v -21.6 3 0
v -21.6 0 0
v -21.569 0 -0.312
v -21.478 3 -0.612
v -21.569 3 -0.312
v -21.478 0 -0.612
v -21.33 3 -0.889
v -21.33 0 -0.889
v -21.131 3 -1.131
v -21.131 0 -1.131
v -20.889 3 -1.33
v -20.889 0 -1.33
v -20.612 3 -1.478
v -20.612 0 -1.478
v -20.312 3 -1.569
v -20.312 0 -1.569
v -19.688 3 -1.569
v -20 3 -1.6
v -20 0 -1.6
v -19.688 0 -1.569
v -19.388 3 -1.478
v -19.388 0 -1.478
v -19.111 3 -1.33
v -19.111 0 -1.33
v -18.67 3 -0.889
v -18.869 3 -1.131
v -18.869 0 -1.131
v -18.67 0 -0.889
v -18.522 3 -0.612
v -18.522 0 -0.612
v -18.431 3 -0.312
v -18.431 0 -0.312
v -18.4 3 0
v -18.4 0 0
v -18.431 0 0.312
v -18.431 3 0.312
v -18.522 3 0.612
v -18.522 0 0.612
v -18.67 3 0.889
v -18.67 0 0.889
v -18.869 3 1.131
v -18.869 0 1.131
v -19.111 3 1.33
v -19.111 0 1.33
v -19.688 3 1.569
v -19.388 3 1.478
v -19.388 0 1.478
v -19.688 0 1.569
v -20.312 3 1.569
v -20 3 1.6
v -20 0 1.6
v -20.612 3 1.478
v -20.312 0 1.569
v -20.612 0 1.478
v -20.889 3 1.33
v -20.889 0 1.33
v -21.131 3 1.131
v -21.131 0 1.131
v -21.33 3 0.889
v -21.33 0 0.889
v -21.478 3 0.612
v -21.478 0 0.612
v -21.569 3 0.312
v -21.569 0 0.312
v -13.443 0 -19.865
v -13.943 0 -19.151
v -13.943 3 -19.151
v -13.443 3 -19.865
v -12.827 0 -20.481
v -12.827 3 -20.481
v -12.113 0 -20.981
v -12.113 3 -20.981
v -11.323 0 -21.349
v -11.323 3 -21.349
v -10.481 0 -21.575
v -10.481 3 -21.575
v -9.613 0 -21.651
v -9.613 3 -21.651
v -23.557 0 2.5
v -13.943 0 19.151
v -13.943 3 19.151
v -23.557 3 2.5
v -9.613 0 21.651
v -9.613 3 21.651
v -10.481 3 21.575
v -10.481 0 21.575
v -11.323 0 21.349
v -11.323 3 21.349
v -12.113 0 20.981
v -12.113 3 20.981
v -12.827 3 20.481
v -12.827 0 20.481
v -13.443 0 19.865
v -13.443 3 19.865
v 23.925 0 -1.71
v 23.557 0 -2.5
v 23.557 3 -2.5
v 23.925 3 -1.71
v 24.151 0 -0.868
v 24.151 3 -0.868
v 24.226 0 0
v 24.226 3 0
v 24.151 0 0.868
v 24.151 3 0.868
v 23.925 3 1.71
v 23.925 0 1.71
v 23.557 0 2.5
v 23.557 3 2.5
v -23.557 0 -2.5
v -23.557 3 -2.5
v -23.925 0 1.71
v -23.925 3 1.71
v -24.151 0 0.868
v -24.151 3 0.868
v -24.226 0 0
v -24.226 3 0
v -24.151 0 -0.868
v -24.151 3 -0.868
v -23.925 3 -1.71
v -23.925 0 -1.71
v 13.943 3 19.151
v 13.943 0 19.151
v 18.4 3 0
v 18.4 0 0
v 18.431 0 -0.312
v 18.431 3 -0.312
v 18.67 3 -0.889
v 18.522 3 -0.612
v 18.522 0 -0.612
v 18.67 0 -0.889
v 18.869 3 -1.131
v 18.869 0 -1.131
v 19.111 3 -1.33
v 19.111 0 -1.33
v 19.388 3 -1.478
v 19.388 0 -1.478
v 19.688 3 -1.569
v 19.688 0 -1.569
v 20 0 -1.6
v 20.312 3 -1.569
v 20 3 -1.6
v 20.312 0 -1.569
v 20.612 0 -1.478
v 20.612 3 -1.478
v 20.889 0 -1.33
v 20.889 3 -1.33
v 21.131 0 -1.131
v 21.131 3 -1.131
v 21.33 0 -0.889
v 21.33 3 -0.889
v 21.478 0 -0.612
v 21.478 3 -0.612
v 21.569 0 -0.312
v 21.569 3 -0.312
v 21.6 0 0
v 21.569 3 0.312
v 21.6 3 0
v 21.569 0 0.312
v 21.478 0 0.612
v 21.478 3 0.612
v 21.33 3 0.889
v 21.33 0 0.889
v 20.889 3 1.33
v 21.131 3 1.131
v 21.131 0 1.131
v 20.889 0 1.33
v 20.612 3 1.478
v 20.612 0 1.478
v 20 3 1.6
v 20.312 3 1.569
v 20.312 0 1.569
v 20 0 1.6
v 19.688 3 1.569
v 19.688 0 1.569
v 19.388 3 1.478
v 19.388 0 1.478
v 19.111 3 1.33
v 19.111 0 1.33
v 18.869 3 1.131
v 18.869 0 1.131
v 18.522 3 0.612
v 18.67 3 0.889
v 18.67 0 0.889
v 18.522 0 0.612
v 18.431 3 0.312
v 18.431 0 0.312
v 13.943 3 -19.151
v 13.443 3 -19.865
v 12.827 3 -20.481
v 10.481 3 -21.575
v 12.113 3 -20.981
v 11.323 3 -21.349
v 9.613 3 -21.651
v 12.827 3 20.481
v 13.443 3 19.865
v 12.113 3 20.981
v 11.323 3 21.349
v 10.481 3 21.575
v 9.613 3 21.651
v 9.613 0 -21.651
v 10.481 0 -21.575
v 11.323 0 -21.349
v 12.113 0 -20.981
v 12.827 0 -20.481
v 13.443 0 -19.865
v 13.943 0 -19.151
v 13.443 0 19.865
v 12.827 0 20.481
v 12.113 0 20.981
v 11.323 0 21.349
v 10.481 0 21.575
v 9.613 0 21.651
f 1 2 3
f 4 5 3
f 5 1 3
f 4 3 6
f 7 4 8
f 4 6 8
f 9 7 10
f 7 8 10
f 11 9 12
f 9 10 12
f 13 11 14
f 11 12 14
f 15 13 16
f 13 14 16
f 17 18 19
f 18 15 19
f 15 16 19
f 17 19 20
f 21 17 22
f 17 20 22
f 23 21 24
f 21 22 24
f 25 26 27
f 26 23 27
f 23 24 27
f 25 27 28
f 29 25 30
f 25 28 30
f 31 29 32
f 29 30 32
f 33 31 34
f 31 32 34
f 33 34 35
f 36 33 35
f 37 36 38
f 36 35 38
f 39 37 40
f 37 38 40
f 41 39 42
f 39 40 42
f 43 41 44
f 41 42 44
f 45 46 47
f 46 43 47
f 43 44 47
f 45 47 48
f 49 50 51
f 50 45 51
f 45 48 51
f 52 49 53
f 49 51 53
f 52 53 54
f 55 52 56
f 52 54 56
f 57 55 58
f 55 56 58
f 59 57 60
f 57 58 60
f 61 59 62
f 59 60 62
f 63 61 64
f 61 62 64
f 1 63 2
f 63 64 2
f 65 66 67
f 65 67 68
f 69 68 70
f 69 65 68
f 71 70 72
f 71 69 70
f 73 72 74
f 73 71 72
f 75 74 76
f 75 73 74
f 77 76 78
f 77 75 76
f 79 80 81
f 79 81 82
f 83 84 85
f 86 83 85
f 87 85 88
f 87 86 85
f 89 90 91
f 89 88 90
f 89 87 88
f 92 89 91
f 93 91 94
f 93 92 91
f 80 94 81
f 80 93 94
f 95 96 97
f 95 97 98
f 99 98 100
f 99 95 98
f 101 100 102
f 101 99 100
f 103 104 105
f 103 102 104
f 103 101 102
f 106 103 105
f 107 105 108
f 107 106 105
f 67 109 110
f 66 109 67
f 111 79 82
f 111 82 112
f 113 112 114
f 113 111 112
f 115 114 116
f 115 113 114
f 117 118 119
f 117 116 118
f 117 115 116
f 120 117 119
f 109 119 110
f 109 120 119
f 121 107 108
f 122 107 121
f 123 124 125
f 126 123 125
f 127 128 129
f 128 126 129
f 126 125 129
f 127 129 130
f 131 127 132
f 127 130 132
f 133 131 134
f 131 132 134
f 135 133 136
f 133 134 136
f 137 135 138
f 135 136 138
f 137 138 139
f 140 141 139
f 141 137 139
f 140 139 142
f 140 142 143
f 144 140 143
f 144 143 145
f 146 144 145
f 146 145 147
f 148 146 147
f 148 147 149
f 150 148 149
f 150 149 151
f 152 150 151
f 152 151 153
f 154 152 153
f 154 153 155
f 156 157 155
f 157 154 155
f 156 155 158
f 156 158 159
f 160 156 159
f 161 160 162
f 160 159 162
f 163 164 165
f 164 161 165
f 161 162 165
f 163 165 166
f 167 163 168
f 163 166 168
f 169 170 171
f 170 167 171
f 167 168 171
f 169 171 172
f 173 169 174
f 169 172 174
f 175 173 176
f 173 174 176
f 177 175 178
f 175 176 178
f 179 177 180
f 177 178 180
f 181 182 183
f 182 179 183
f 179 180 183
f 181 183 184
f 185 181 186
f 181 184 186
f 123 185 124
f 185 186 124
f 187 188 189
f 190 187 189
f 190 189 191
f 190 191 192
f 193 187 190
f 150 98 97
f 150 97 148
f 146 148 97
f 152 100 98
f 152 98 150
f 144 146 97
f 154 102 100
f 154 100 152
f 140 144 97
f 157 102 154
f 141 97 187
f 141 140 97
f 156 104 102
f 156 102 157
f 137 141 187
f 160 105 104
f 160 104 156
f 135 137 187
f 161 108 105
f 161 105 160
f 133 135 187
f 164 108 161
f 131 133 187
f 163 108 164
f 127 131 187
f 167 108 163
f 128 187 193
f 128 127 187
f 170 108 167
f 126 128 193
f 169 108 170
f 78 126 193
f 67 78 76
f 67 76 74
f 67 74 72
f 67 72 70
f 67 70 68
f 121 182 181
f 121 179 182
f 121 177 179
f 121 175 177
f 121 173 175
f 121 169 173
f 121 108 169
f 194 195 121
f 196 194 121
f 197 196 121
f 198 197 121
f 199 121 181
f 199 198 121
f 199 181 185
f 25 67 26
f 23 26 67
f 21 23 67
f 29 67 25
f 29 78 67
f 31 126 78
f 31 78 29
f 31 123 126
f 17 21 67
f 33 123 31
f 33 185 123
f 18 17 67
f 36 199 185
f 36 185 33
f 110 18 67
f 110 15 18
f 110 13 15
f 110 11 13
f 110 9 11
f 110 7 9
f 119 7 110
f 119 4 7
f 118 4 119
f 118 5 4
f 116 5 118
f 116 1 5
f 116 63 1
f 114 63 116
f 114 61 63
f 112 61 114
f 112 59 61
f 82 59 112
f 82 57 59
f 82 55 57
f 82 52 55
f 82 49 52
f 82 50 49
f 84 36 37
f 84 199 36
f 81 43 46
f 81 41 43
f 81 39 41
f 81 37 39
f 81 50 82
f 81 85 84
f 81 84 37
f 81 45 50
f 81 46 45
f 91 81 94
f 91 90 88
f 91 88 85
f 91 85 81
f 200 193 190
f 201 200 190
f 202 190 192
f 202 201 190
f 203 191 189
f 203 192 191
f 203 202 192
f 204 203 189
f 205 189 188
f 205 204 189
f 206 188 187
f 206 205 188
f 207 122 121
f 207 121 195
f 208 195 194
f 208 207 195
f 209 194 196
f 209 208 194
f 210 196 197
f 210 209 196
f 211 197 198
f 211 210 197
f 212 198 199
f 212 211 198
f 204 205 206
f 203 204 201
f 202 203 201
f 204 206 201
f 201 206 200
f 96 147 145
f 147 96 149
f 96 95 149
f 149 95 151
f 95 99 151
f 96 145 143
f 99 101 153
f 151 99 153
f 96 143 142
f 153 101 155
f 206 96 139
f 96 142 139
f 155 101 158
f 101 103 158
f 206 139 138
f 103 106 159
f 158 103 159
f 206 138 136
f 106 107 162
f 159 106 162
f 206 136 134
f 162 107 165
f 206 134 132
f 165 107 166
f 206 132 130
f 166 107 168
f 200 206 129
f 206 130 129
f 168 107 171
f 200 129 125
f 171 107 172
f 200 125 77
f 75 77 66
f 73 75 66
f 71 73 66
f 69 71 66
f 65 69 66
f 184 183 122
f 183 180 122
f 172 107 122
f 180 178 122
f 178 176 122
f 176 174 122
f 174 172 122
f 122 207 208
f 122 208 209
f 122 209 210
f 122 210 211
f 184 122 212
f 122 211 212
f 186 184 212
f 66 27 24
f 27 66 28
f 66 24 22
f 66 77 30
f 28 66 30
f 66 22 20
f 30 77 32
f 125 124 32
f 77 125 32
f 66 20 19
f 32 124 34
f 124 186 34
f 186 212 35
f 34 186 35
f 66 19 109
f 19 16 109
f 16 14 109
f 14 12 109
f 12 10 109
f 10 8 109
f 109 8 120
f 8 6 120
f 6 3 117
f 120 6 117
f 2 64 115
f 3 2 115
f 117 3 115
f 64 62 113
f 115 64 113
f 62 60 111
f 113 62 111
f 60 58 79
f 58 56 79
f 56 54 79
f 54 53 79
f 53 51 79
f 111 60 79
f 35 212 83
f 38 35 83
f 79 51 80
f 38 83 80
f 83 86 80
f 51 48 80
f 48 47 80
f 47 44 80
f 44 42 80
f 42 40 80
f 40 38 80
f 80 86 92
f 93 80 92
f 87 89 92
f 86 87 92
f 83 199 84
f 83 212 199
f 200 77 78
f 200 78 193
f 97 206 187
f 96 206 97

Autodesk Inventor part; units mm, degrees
ref_plane "YZ Plane" through (0, 0, 0) normal (1, 0, 0) x (0, 1, 0)
ref_plane "XZ Plane" through (0, 0, 0) normal (0, 1, 0) x (-1, 0, 0)
ref_plane "XY Plane" through (0, 0, 0) normal (0, 0, 1) x (1, 0, 0)
sketch "Sketch1" plane through (0, 0, 0) normal (0, 1, 0) x (-1, 0, 0)
  line L0 (23.5566, -2.5) -> (13.9434, -19.1506)
  line L1 (9.6132, -21.6506) -> (-9.6132, -21.6506)
  line L2 (-13.9434, -19.1506) -> (-23.5566, -2.5)
  line L3 (-23.5566, 2.5) -> (-13.9434, 19.1506)
  line L4 (-9.6132, 21.6506) -> (9.6132, 21.6506)
  line L5 (13.9434, 19.1506) -> (23.5566, 2.5)
  line L6 (0, 0) -> (20, 0)
  line L7 (0, 0) -> (-20, 0)
  circle A0 centre (20, 0) radius 1.6
  circle A1 centre (-20, 0) radius 1.6
  arc A2 (13.9434, 19.1506) -> (9.6132, 21.6506) centre (9.6132, 16.6506) ccw
  arc A3 (23.5566, -2.5) -> (23.5566, 2.5) centre (19.2265, 0) ccw
  arc A4 (9.6132, -21.6506) -> (13.9434, -19.1506) centre (9.6132, -16.6506) ccw
  arc A5 (-13.9434, -19.1506) -> (-9.6132, -21.6506) centre (-9.6132, -16.6506) ccw
  arc A6 (-23.5566, 2.5) -> (-23.5566, -2.5) centre (-19.2265, 0) ccw
  arc A7 (-9.6132, 21.6506) -> (-13.9434, 19.1506) centre (-9.6132, 16.6506) ccw
  point P0 (25, 0)
  point P1 (12.5, -21.6506)
  point P2 (-12.5, -21.6506)
  point P3 (-25, 0)
  point P4 (-12.5, 21.6506)
  point P5 (12.5, 21.6506)
  dimension "d0" = 50
  dimension "d1" = 20
  dimension "d2" = 20
  dimension "d3" = 3.2
  dimension "d4" = 3.2
  dimension "d5" = 5
extrude "Extrusion1" add sketch "Sketch1" along normal blind 3
properties part number "Battery cover hex"
